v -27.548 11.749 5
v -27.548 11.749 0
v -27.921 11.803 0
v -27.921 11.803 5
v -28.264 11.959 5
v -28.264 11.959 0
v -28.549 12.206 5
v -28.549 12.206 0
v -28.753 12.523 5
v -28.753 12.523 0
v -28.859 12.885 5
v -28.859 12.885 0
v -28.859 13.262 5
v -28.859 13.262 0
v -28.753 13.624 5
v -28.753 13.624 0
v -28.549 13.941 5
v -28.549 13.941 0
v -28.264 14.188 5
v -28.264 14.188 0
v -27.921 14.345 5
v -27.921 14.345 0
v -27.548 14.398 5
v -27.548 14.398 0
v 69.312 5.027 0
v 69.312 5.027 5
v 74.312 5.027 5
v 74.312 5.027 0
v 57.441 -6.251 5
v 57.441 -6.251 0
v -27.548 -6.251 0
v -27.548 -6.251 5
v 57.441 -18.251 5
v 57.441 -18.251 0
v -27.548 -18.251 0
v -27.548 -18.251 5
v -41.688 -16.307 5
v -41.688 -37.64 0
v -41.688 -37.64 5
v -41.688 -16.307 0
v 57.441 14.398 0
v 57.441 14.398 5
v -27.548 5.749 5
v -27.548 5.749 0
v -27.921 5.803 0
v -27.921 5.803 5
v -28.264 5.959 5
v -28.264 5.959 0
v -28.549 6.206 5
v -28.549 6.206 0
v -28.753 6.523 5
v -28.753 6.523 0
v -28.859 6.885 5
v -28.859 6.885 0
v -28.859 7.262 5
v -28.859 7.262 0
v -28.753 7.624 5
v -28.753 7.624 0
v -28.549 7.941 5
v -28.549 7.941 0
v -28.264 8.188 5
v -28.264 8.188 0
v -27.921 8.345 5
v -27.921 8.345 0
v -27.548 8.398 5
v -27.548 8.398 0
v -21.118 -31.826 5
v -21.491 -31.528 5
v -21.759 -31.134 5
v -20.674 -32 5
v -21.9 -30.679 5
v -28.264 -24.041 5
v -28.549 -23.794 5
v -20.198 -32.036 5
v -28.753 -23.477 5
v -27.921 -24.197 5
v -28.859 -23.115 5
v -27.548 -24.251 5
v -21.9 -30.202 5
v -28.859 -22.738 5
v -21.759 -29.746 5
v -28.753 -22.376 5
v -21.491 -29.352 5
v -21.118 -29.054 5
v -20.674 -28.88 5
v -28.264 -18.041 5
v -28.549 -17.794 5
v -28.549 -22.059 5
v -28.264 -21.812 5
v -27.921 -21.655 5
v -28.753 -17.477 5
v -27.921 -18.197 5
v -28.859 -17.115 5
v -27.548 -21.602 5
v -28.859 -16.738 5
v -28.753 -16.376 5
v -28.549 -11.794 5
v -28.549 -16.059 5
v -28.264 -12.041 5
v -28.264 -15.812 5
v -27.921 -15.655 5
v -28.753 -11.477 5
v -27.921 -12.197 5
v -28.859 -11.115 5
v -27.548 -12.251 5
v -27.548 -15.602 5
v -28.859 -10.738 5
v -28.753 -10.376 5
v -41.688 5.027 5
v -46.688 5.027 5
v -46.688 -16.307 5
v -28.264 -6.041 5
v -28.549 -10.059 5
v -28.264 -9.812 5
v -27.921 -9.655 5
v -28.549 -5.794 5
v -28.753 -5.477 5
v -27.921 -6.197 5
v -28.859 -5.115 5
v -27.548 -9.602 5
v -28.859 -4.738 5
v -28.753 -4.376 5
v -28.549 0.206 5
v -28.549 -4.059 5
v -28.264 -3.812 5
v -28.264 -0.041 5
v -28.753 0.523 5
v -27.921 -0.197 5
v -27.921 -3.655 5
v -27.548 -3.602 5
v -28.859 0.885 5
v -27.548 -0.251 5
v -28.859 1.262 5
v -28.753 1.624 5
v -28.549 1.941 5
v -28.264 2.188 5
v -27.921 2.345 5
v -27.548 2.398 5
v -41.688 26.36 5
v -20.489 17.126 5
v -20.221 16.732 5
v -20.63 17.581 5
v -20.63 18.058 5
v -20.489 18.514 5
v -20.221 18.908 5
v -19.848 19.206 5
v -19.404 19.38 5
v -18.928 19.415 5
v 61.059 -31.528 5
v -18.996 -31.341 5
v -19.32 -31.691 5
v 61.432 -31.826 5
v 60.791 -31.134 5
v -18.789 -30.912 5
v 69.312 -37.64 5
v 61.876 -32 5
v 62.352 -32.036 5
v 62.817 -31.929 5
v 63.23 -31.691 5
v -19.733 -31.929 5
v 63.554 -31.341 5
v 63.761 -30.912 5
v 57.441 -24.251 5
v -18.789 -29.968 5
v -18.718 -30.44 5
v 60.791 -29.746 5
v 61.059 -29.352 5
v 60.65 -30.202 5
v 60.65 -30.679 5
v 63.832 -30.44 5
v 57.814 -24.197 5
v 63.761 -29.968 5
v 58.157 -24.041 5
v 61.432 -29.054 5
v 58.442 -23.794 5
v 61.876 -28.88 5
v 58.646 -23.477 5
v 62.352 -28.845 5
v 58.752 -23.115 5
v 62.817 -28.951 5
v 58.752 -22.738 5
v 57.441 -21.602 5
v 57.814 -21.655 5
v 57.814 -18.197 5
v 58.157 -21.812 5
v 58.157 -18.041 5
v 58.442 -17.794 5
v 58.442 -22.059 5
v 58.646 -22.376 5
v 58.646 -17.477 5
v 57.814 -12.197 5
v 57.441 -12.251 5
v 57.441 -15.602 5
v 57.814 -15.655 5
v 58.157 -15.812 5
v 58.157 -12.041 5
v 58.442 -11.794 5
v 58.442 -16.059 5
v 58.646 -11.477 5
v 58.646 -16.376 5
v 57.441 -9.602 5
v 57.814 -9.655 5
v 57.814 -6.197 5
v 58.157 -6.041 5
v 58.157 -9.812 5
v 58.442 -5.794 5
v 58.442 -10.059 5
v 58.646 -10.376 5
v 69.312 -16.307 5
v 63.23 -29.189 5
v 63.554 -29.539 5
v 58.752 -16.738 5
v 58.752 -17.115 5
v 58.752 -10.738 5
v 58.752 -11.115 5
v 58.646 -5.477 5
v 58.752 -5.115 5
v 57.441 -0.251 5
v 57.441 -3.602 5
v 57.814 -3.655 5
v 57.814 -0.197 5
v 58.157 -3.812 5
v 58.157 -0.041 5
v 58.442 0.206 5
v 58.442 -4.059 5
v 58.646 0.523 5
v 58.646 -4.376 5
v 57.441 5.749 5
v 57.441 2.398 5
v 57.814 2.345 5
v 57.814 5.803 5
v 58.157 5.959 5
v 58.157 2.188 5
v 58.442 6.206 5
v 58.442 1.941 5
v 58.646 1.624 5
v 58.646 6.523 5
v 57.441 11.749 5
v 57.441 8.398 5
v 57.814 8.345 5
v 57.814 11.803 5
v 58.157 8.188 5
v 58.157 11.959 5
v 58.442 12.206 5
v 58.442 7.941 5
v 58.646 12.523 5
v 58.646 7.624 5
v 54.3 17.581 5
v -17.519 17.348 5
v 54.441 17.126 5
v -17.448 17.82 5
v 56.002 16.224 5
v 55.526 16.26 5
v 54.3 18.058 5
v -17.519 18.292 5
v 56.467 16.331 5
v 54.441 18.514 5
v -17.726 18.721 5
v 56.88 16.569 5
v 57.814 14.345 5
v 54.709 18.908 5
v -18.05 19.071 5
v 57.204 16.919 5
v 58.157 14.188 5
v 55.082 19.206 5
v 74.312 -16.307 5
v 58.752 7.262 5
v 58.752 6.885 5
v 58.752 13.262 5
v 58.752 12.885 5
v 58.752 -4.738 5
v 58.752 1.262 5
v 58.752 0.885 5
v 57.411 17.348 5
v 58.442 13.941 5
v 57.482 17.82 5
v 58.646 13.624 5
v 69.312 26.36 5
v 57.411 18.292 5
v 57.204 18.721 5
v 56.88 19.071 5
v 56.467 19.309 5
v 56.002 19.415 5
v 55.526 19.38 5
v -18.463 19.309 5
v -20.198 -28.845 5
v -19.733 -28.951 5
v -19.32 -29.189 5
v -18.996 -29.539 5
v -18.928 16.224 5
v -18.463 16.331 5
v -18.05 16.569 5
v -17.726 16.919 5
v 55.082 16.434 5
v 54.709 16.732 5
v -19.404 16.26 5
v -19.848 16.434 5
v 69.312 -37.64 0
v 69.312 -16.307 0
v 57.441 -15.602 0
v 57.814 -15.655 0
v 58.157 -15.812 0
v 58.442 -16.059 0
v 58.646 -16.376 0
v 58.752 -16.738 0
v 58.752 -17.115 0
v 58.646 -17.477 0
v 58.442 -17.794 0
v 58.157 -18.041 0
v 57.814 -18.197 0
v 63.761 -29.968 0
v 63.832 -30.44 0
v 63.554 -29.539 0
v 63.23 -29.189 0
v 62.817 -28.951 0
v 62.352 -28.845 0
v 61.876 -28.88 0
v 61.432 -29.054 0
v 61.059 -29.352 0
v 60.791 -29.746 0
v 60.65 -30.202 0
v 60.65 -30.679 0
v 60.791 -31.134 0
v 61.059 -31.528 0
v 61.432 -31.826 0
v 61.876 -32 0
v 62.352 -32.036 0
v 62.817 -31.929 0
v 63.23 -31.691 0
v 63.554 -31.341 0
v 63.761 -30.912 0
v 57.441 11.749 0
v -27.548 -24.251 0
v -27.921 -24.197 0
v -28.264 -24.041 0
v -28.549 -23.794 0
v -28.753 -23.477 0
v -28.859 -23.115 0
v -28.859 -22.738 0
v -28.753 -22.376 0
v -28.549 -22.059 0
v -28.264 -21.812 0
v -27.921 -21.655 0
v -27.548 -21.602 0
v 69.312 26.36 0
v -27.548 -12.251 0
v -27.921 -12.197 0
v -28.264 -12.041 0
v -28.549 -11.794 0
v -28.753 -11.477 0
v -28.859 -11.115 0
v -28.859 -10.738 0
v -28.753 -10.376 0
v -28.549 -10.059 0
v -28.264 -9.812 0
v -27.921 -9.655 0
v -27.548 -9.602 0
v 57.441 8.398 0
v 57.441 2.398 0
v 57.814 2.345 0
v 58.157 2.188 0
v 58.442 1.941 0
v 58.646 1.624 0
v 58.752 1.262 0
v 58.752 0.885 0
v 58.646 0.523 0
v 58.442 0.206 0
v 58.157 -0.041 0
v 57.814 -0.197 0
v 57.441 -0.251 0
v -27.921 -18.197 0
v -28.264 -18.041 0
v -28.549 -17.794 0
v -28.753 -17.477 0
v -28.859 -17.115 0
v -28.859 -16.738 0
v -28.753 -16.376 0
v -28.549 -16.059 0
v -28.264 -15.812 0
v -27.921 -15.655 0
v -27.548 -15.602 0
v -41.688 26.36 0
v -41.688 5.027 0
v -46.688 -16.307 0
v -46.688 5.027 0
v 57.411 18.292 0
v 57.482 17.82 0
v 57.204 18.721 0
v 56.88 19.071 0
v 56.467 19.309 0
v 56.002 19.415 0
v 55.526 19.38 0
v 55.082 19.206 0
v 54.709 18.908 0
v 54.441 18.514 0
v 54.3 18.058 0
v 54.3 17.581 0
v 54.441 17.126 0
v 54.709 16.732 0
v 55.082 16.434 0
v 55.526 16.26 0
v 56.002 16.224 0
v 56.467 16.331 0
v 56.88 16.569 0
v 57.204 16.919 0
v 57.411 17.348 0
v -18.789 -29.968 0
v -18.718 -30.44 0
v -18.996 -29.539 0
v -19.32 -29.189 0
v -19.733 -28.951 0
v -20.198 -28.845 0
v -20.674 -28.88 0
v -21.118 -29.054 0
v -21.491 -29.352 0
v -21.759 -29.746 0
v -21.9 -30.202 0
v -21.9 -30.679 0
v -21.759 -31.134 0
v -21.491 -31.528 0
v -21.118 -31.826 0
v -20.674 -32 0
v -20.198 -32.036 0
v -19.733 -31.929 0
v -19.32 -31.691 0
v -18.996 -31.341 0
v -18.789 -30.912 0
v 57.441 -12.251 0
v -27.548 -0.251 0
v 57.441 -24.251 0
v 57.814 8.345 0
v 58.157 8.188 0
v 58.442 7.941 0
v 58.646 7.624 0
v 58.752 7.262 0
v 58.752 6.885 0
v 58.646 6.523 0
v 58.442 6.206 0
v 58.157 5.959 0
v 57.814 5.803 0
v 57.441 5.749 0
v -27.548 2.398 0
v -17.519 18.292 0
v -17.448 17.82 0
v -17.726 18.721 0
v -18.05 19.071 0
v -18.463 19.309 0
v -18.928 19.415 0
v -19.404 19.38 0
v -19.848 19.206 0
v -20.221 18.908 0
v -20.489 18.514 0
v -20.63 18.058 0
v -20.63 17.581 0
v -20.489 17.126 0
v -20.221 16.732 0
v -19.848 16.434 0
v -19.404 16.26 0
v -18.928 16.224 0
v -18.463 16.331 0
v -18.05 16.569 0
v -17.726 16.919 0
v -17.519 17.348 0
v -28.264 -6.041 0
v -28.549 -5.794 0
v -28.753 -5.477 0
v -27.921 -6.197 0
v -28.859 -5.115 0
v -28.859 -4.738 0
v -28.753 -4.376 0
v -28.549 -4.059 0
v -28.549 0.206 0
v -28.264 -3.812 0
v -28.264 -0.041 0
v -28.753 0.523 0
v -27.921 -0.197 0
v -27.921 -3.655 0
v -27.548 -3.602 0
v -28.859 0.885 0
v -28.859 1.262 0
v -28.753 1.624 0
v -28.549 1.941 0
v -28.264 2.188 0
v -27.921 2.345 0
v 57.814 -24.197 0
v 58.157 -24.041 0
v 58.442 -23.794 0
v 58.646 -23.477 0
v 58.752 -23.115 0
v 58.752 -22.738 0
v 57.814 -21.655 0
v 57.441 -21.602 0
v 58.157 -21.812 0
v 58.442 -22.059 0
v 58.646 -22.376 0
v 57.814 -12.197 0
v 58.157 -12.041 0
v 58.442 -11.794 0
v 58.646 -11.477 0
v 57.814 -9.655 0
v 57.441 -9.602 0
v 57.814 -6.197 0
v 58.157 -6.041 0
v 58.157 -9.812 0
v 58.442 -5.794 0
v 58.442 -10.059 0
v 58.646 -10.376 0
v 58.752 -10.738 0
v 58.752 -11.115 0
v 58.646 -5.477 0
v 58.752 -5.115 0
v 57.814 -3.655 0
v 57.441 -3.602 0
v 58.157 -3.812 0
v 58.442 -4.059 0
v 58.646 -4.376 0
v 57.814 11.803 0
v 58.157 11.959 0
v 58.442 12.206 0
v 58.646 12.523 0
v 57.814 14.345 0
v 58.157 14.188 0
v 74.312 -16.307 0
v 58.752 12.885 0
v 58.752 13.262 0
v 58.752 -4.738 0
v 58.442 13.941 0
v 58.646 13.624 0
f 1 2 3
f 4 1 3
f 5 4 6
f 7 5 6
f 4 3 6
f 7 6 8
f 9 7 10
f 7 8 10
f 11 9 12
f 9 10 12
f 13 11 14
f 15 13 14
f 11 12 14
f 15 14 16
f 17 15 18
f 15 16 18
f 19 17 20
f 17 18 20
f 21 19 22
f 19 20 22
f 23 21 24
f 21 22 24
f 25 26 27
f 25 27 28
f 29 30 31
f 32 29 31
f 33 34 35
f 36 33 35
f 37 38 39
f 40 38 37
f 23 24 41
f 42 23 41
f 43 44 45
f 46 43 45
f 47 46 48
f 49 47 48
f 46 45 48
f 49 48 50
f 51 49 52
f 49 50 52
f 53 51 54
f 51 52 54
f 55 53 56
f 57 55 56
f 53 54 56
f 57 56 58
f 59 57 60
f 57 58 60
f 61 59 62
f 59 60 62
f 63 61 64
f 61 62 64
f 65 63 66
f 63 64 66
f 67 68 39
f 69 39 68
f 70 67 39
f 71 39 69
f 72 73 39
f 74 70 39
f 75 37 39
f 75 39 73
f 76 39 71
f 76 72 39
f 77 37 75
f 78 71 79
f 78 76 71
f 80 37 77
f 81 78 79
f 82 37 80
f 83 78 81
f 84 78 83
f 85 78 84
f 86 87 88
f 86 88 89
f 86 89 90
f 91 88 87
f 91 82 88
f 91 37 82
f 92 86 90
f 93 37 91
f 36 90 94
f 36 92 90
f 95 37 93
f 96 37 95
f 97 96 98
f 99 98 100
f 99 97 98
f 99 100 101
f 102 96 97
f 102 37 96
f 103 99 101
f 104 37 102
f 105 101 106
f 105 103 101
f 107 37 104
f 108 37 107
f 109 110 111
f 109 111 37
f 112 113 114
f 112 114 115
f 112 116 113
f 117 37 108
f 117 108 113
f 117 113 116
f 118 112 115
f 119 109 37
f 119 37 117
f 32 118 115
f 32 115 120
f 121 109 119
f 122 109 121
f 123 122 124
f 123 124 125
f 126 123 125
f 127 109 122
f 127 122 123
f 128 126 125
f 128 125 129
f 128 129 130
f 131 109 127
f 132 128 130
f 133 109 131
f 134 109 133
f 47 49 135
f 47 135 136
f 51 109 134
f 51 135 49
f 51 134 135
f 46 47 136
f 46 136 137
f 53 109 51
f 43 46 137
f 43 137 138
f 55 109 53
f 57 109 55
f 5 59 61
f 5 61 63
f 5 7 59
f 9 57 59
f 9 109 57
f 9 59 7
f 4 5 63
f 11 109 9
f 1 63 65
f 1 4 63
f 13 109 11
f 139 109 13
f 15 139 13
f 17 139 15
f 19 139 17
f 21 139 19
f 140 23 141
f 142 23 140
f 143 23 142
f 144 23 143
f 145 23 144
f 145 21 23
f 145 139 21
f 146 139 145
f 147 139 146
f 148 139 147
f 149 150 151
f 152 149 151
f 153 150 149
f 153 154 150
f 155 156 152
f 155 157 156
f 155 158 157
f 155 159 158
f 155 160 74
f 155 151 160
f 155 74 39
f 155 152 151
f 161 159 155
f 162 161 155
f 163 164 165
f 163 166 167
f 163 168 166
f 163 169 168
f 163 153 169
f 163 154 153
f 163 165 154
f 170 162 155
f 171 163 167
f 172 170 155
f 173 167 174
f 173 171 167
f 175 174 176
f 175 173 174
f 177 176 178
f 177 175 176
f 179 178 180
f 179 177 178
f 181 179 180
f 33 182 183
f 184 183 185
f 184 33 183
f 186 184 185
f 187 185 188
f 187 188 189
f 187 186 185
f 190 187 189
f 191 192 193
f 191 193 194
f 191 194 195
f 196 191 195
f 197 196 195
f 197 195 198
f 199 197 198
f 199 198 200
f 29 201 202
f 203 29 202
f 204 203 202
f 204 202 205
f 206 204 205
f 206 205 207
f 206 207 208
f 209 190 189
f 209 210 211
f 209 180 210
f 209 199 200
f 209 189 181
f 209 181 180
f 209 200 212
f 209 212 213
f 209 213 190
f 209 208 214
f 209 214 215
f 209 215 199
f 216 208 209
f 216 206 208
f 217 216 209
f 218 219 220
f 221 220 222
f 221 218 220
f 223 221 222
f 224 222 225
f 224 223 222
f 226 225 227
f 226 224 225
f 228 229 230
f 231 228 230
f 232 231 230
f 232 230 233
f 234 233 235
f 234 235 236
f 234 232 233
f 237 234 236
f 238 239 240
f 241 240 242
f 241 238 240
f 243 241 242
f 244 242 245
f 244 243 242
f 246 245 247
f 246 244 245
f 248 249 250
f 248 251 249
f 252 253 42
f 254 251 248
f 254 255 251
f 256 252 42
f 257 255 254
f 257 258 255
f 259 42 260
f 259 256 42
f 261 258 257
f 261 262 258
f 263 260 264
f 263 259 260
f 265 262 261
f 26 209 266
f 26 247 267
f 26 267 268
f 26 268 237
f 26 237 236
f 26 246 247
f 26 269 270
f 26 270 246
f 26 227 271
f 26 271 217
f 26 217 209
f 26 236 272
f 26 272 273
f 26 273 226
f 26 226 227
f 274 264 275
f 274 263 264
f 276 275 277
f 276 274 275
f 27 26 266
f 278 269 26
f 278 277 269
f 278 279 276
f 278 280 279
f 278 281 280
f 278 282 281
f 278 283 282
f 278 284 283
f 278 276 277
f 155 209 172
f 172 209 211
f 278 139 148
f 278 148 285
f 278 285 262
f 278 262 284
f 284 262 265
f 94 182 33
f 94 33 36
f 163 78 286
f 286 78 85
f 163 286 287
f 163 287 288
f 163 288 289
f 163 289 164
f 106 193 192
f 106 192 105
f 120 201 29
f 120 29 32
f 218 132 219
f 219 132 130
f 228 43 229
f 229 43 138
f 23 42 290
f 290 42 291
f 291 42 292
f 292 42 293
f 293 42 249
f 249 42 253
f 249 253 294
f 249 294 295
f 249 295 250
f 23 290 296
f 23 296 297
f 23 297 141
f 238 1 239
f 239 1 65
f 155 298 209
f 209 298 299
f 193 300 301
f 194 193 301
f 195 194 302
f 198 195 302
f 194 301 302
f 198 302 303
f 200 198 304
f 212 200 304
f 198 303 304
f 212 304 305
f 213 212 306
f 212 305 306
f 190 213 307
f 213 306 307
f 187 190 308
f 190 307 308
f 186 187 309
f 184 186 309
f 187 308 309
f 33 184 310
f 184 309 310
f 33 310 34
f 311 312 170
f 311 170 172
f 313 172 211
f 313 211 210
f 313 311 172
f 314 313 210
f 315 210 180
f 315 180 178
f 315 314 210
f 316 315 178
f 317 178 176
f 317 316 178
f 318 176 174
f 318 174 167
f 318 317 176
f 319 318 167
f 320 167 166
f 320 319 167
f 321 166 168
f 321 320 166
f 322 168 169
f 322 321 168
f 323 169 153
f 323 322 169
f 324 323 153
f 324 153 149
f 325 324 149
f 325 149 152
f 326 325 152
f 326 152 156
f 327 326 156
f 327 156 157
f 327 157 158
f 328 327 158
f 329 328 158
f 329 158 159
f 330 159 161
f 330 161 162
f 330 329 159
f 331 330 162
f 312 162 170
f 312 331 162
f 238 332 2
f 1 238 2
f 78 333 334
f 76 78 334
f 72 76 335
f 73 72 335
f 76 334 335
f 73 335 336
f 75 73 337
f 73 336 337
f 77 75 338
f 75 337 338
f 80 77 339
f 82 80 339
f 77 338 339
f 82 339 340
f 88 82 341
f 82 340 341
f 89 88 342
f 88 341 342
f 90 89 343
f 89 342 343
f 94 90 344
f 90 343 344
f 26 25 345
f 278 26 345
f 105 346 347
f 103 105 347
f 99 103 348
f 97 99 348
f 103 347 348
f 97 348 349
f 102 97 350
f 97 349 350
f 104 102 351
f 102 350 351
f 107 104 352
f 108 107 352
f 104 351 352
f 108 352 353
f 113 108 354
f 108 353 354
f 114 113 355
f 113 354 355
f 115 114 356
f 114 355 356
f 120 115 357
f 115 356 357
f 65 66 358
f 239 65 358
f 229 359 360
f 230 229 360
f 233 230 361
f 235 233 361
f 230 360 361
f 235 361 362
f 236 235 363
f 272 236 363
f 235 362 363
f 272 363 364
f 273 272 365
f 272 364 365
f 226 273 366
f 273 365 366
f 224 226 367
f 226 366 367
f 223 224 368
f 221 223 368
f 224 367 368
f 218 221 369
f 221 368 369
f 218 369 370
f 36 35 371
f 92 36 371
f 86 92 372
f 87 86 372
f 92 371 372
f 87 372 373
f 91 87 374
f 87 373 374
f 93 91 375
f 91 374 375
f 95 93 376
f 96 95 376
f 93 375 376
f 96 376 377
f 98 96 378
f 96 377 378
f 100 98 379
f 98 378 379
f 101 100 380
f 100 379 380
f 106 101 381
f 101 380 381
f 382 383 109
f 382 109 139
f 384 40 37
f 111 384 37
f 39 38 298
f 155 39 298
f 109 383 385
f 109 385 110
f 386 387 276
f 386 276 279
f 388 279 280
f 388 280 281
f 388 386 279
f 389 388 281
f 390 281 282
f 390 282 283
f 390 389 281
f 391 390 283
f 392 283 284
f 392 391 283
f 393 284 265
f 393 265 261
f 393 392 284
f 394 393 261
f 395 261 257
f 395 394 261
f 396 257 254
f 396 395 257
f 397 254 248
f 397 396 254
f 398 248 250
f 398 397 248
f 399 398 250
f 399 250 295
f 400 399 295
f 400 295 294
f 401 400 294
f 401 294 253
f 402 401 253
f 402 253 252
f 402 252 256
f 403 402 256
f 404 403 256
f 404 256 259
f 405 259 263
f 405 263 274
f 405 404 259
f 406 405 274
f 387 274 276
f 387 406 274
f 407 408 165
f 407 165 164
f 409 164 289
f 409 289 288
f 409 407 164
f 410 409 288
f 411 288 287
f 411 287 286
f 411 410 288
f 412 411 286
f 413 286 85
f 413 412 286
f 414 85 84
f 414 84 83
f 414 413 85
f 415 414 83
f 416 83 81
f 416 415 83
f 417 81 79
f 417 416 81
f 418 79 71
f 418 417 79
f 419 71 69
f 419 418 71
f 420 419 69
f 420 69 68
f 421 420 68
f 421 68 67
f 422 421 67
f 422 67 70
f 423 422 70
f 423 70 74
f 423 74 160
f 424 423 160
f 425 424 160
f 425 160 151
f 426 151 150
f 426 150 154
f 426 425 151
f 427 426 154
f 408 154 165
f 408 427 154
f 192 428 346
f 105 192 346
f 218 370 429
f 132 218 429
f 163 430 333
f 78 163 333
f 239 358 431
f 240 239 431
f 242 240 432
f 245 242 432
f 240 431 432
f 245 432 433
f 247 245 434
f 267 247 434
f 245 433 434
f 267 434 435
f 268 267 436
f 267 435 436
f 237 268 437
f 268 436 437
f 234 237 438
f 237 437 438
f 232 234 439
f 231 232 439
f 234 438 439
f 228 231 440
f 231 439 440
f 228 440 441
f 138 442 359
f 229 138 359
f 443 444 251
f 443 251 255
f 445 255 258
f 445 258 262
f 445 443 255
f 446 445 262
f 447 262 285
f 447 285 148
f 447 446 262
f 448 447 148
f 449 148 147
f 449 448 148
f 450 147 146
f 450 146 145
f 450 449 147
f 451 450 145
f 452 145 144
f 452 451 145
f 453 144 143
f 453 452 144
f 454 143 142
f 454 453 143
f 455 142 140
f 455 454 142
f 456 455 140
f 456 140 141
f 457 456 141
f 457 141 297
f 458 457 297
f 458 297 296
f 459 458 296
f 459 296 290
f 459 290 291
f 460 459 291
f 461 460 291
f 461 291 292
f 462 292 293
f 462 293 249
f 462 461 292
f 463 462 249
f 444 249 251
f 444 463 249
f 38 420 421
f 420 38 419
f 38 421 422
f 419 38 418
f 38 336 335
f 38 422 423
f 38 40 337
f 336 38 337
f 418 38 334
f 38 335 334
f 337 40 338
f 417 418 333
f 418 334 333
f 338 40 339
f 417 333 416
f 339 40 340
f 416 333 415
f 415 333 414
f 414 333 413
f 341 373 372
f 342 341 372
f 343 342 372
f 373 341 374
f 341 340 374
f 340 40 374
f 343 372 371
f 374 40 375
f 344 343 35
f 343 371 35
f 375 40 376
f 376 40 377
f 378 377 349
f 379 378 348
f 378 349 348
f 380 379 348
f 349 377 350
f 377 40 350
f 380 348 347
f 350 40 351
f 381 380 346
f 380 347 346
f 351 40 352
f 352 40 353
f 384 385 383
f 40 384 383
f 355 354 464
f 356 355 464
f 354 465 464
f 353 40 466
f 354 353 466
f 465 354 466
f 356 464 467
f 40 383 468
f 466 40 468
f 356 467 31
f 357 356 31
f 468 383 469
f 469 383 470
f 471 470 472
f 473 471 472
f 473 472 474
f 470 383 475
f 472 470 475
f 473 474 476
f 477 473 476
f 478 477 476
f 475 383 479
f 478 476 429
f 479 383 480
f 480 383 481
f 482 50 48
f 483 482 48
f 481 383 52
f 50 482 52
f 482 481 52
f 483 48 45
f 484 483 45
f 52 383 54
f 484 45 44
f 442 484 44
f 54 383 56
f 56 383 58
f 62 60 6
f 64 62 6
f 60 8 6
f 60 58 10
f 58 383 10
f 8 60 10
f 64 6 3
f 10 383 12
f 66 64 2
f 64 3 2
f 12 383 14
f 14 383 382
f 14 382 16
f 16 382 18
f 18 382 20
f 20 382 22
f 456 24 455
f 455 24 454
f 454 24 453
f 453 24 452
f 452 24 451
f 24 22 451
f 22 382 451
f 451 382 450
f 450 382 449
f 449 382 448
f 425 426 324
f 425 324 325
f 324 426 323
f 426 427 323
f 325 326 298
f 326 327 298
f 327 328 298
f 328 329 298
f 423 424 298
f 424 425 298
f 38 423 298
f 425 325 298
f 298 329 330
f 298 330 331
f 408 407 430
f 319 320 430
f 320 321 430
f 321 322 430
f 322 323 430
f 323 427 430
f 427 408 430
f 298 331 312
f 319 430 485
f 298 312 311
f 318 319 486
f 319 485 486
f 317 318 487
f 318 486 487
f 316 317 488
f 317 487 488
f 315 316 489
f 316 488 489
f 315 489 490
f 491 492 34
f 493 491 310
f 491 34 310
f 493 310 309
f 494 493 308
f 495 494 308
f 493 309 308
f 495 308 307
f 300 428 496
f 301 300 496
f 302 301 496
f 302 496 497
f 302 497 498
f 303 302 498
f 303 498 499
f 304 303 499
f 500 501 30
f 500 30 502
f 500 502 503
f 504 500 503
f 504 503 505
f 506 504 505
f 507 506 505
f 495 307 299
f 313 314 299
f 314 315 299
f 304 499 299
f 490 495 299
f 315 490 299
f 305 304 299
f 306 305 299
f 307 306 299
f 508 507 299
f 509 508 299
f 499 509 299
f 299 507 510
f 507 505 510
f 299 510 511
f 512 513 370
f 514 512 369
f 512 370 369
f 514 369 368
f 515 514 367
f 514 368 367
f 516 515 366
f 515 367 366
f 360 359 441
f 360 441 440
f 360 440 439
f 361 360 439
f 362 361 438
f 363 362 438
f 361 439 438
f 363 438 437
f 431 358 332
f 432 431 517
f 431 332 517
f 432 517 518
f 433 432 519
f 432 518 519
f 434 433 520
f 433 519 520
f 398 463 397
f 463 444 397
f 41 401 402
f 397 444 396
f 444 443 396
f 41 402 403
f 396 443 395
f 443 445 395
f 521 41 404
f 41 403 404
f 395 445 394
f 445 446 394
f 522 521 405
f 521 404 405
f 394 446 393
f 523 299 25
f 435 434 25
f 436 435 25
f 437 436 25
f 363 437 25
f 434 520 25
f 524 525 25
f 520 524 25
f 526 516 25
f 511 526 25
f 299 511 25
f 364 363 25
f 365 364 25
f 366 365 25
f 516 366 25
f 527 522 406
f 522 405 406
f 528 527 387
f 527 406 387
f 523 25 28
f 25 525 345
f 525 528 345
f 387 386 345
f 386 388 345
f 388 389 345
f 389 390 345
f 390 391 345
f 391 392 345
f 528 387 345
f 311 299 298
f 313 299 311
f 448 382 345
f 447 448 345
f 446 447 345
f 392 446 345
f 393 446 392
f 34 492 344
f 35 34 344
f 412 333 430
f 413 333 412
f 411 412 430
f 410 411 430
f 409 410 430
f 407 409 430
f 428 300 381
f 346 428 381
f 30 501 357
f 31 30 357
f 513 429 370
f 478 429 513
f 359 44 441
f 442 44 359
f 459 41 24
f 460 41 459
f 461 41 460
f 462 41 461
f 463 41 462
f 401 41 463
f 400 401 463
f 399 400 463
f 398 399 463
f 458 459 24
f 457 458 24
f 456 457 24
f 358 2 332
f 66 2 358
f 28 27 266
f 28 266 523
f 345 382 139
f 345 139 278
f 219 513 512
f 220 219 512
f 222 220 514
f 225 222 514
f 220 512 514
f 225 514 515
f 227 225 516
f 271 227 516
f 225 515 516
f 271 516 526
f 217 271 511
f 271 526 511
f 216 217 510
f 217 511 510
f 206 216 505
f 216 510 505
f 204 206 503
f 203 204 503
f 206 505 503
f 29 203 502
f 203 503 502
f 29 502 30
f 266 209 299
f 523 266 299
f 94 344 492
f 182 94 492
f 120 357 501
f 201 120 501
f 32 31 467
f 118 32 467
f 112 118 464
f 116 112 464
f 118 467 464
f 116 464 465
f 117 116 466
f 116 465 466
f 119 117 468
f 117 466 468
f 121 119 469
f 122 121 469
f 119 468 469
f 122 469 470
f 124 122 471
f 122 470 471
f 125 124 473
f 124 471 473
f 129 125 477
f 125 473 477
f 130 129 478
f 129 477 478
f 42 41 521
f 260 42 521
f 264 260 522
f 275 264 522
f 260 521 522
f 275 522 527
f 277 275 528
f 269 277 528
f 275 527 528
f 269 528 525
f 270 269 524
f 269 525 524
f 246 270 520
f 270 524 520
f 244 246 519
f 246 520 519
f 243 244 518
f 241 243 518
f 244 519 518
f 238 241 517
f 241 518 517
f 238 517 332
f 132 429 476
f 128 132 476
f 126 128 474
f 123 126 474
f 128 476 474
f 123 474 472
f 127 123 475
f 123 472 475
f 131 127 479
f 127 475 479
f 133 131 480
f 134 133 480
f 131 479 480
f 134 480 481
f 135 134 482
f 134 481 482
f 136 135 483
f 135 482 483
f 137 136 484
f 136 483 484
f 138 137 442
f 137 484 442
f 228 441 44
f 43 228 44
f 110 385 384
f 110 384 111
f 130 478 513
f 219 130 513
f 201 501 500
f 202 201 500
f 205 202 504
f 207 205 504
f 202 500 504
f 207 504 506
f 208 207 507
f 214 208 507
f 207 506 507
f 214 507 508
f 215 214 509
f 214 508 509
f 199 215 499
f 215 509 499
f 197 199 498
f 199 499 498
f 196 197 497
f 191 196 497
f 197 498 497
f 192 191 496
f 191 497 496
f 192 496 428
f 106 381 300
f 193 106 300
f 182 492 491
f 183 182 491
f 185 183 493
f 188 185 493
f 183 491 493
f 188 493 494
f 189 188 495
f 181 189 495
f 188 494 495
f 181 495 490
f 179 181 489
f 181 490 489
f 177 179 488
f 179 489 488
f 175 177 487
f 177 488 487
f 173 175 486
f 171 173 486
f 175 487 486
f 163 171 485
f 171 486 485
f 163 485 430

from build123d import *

# Parameters (mm, degrees)
CROQUIS1_W              = 111
CROQUIS1_H              = 64
CROQUIS1_R              = 1.6
SALIENTE_EXTRUIR1_DEPTH = 5
CROQUIS2_W              = 5
CROQUIS2_H              = 21.3333333
SALIENTE_EXTRUIR2_DEPTH = 5
CROQUIS3_W              = 5
CROQUIS3_H              = 21.3333333
SALIENTE_EXTRUIR3_DEPTH = 5


with BuildPart() as part:
    # Croquis1 → Saliente-Extruir1 (new body)
    with BuildSketch(Plane.XY):
        with Locations((13.812375919, -5.640074375)):
            Rectangle(CROQUIS1_W, CROQUIS1_H)
        with Locations((-20.317624082, -30.440068587)):
            Circle(CROQUIS1_R, mode=Mode.SUBTRACT)
        with Locations((-19.047624082, 17.819931413)):
            Circle(CROQUIS1_R, mode=Mode.SUBTRACT)
        with Locations((55.882375918, 17.819931413)):
            Circle(CROQUIS1_R, mode=Mode.SUBTRACT)
        with Locations((62.232375918, -30.440068587)):
            Circle(CROQUIS1_R, mode=Mode.SUBTRACT)
        with BuildLine():
            Line((-27.547897963, 14.398218547), (57.441208347, 14.398218547))
            ThreePointArc((57.441208347, 14.398218547), (58.7657139, 13.073712995), (57.441208347, 11.749207442))
            Line((57.441208347, 11.749207442), (-27.547897963, 11.749207442))
            ThreePointArc((-27.547897963, 11.749207442), (-28.872403516, 13.073712995), (-27.547897963, 14.398218547))
        make_face(mode=Mode.SUBTRACT)
        with BuildLine():
            Line((-27.547897963, 8.398218547), (57.441208347, 8.398218547))
            ThreePointArc((57.441208347, 8.398218547), (58.7657139, 7.073712995), (57.441208347, 5.749207442))
            Line((57.441208347, 5.749207442), (-27.547897963, 5.749207442))
            ThreePointArc((-27.547897963, 5.749207442), (-28.872403516, 7.073712995), (-27.547897963, 8.398218547))
        make_face(mode=Mode.SUBTRACT)
        with BuildLine():
            Line((-27.547897963, 2.398218547), (57.441208347, 2.398218547))
            ThreePointArc((57.441208347, 2.398218547), (58.7657139, 1.073712995), (57.441208347, -0.250792558))
            Line((57.441208347, -0.250792558), (-27.547897963, -0.250792558))
            ThreePointArc((-27.547897963, -0.250792558), (-28.872403516, 1.073712995), (-27.547897963, 2.398218547))
        make_face(mode=Mode.SUBTRACT)
        with BuildLine():
            Line((-27.547897963, -3.601781453), (57.441208347, -3.601781453))
            ThreePointArc((57.441208347, -3.601781453), (58.7657139, -4.926287005), (57.441208347, -6.250792558))
            Line((57.441208347, -6.250792558), (-27.547897963, -6.250792558))
            ThreePointArc((-27.547897963, -6.250792558), (-28.872403516, -4.926287005), (-27.547897963, -3.601781453))
        make_face(mode=Mode.SUBTRACT)
        with BuildLine():
            Line((-27.547897963, -9.601781453), (57.441208347, -9.601781453))
            ThreePointArc((57.441208347, -9.601781453), (58.7657139, -10.926287005), (57.441208347, -12.250792558))
            Line((57.441208347, -12.250792558), (-27.547897963, -12.250792558))
            ThreePointArc((-27.547897963, -12.250792558), (-28.872403516, -10.926287005), (-27.547897963, -9.601781453))
        make_face(mode=Mode.SUBTRACT)
        with BuildLine():
            Line((-27.547897963, -15.601781453), (57.441208347, -15.601781453))
            ThreePointArc((57.441208347, -15.601781453), (58.7657139, -16.926287005), (57.441208347, -18.250792558))
            Line((57.441208347, -18.250792558), (-27.547897963, -18.250792558))
            ThreePointArc((-27.547897963, -18.250792558), (-28.872403516, -16.926287005), (-27.547897963, -15.601781453))
        make_face(mode=Mode.SUBTRACT)
        with BuildLine():
            Line((-27.547897963, -21.601781453), (57.441208347, -21.601781453))
            ThreePointArc((57.441208347, -21.601781453), (58.7657139, -22.926287005), (57.441208347, -24.250792558))
            Line((57.441208347, -24.250792558), (-27.547897963, -24.250792558))
            ThreePointArc((-27.547897963, -24.250792558), (-28.872403516, -22.926287005), (-27.547897963, -21.601781453))
        make_face(mode=Mode.SUBTRACT)
    extrude(amount=SALIENTE_EXTRUIR1_DEPTH)

    # Croquis2 → Saliente-Extruir2 (add)
    with BuildSketch(Plane.ZY.offset(41.687624081)):
        with Locations((2.5, -5.640074358)):
            Rectangle(CROQUIS2_W, CROQUIS2_H)
    extrude(amount=SALIENTE_EXTRUIR2_DEPTH)

    # Croquis3 → Saliente-Extruir3 (add)
    with BuildSketch(Plane(origin=(69.312375919, 0, 0), x_dir=(0, 0, -1), z_dir=(1, 0, 0))):
        with Locations((-2.5, -5.640074358)):
            Rectangle(CROQUIS3_W, CROQUIS3_H)
    extrude(amount=SALIENTE_EXTRUIR3_DEPTH)


solid = part.part
